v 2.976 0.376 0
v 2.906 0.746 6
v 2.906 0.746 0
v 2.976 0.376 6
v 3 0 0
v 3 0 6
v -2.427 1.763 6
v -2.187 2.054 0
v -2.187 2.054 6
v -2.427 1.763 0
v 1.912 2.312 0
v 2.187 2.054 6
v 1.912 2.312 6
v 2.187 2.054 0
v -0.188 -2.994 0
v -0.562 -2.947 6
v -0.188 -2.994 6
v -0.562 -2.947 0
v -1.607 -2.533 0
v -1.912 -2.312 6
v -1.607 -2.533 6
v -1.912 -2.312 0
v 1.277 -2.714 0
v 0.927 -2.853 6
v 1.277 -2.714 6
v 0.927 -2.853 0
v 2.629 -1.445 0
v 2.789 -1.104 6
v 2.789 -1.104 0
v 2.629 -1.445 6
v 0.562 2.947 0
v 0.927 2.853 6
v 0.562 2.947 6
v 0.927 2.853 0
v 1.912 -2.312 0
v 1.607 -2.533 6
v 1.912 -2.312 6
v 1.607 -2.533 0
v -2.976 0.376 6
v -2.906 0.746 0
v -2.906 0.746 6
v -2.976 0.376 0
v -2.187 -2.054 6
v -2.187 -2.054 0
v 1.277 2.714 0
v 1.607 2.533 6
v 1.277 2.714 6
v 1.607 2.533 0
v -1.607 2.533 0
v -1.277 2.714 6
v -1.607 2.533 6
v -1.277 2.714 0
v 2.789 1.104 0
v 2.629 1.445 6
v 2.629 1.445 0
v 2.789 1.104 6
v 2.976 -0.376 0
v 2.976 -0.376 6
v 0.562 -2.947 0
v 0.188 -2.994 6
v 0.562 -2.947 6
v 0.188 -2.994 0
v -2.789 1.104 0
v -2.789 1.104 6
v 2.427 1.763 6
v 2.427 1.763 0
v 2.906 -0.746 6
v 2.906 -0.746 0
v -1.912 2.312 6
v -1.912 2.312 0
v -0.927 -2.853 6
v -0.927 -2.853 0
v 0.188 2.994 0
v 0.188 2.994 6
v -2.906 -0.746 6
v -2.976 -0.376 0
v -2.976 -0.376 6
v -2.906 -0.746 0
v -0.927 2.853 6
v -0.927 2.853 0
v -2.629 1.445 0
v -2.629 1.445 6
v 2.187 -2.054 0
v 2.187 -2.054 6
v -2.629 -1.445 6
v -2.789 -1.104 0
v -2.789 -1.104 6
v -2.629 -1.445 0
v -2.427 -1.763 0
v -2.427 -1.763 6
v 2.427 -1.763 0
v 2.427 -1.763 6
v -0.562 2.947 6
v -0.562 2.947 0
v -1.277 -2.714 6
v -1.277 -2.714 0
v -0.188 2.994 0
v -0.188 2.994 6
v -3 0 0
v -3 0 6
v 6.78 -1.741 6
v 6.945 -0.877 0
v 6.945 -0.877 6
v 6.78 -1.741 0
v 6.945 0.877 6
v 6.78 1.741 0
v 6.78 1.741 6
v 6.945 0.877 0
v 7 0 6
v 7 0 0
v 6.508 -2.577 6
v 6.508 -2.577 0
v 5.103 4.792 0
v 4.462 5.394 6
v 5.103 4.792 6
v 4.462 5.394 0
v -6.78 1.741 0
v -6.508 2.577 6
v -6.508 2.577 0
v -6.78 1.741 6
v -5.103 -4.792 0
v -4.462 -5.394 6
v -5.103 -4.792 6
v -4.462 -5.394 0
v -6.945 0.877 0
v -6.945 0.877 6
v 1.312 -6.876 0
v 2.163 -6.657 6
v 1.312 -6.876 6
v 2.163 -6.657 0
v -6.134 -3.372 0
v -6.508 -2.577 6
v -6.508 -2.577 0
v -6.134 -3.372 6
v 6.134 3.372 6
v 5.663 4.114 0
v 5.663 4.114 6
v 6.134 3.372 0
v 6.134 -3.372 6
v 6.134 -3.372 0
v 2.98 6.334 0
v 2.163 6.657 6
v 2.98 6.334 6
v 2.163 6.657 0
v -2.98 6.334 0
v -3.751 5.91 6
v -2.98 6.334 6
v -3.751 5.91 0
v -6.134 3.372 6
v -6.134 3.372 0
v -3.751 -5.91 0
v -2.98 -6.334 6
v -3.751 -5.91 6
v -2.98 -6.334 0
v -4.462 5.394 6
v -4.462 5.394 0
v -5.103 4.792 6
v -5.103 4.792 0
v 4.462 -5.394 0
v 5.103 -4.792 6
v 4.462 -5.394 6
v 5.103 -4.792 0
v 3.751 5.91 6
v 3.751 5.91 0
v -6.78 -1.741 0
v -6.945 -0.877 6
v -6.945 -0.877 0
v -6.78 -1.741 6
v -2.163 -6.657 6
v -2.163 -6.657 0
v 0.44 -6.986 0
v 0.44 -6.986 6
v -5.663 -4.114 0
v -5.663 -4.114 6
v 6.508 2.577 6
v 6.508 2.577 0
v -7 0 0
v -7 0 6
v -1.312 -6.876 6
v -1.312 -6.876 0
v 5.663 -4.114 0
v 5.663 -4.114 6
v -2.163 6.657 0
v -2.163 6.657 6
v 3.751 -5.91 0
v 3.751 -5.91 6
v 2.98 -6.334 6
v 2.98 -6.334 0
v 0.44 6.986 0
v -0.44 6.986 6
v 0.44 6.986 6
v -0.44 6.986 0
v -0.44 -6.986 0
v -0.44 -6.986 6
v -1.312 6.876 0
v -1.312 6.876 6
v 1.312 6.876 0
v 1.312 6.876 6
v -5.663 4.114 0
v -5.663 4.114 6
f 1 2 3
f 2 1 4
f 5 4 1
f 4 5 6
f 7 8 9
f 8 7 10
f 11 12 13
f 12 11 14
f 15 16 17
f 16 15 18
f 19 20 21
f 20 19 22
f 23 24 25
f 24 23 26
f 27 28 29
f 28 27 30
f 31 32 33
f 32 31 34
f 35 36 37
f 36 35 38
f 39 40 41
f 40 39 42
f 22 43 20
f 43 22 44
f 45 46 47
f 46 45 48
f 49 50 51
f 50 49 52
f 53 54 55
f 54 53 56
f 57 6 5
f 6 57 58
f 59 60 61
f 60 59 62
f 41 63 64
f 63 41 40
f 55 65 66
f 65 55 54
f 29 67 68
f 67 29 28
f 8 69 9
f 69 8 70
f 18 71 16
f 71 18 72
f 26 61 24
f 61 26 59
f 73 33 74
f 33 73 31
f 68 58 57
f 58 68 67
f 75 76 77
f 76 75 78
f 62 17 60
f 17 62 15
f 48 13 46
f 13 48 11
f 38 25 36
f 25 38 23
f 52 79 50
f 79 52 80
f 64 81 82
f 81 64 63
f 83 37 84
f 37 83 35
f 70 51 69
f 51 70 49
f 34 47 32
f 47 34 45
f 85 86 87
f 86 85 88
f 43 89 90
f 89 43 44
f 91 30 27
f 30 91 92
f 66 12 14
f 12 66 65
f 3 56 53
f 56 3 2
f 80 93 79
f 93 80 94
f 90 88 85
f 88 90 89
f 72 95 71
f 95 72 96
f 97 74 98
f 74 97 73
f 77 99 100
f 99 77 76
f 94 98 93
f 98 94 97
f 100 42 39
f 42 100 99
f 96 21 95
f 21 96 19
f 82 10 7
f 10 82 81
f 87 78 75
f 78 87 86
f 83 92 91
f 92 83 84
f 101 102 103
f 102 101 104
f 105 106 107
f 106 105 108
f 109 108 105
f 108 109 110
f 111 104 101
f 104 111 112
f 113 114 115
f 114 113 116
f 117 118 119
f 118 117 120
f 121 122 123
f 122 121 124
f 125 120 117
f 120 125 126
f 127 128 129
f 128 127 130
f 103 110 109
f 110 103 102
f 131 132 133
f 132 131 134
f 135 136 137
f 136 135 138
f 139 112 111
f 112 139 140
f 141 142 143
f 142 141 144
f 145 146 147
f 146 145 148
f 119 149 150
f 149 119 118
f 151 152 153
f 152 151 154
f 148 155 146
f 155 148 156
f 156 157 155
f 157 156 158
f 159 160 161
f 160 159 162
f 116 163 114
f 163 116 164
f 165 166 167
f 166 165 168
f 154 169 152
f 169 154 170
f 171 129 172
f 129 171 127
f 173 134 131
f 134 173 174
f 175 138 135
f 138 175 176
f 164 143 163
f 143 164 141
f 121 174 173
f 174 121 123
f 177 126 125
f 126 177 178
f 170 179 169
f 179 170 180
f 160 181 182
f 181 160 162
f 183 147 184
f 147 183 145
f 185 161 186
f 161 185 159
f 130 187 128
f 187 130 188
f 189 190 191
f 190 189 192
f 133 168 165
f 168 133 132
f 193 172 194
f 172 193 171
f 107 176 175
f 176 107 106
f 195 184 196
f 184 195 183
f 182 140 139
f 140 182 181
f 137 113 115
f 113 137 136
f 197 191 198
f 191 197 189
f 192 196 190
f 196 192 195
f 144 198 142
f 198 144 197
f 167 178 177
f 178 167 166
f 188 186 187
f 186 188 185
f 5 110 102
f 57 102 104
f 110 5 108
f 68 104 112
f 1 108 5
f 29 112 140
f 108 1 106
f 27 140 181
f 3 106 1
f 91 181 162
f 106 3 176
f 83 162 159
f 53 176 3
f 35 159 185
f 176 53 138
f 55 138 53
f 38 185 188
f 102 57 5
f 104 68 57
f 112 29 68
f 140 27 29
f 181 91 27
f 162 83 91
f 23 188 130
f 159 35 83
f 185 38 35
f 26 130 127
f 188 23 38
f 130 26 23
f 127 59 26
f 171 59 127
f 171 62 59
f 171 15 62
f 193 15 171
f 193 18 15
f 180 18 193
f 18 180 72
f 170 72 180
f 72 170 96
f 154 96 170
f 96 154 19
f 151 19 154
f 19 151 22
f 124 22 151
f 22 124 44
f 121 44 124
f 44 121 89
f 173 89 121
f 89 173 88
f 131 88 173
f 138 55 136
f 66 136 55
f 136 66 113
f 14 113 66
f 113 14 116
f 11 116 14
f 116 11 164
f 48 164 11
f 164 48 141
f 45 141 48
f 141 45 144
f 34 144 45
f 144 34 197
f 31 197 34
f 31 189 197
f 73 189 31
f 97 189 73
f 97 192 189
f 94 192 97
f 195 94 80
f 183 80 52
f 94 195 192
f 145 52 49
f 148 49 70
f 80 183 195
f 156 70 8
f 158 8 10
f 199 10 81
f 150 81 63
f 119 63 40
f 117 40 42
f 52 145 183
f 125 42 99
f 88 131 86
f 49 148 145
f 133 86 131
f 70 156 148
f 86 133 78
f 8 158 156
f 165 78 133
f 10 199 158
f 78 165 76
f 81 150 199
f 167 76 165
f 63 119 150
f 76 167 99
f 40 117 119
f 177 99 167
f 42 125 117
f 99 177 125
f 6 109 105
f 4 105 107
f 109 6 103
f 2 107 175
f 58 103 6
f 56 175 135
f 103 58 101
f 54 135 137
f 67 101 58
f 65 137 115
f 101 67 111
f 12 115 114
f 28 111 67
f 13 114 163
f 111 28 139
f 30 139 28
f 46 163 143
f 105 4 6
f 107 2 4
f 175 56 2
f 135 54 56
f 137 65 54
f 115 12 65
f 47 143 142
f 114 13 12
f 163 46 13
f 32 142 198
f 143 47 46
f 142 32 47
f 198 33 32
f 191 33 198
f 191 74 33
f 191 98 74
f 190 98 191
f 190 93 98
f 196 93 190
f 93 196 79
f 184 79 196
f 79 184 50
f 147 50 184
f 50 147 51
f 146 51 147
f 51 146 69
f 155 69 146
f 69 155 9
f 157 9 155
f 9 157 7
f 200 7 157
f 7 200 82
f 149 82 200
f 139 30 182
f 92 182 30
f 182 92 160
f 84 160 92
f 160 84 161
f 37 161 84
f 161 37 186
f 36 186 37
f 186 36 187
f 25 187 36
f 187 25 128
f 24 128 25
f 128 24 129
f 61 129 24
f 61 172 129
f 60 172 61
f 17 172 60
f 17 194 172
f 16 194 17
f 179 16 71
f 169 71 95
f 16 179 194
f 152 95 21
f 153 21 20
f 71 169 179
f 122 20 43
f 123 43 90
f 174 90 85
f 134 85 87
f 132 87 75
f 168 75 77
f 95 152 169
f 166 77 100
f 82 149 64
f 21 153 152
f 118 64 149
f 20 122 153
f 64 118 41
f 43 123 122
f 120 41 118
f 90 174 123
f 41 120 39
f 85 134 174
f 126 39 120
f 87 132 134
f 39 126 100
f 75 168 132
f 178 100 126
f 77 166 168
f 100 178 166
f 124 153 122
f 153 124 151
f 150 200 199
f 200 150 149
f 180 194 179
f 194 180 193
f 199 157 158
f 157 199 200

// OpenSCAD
$fn = 50;


difference() {
	union() {
		cylinder(h = 6, r = 7.0000000000);
	}
	union() {
		translate(v = [0.0000000000, 0.0000000000, -100.0000000000]) {
			cylinder(h = 200, r = 3.0000000000);
		}
		translate(v = [0.0000000000, 0.0000000000, -100.0000000000]) {
			cylinder(h = 200, r = 3.0000000000);
		}
		translate(v = [0.0000000000, 0.0000000000, -100.0000000000]) {
			cylinder(h = 200, r = 3.0000000000);
		}
		translate(v = [0.0000000000, 0.0000000000, -100.0000000000]) {
			cylinder(h = 200, r = 3.0000000000);
		}
	}
}
